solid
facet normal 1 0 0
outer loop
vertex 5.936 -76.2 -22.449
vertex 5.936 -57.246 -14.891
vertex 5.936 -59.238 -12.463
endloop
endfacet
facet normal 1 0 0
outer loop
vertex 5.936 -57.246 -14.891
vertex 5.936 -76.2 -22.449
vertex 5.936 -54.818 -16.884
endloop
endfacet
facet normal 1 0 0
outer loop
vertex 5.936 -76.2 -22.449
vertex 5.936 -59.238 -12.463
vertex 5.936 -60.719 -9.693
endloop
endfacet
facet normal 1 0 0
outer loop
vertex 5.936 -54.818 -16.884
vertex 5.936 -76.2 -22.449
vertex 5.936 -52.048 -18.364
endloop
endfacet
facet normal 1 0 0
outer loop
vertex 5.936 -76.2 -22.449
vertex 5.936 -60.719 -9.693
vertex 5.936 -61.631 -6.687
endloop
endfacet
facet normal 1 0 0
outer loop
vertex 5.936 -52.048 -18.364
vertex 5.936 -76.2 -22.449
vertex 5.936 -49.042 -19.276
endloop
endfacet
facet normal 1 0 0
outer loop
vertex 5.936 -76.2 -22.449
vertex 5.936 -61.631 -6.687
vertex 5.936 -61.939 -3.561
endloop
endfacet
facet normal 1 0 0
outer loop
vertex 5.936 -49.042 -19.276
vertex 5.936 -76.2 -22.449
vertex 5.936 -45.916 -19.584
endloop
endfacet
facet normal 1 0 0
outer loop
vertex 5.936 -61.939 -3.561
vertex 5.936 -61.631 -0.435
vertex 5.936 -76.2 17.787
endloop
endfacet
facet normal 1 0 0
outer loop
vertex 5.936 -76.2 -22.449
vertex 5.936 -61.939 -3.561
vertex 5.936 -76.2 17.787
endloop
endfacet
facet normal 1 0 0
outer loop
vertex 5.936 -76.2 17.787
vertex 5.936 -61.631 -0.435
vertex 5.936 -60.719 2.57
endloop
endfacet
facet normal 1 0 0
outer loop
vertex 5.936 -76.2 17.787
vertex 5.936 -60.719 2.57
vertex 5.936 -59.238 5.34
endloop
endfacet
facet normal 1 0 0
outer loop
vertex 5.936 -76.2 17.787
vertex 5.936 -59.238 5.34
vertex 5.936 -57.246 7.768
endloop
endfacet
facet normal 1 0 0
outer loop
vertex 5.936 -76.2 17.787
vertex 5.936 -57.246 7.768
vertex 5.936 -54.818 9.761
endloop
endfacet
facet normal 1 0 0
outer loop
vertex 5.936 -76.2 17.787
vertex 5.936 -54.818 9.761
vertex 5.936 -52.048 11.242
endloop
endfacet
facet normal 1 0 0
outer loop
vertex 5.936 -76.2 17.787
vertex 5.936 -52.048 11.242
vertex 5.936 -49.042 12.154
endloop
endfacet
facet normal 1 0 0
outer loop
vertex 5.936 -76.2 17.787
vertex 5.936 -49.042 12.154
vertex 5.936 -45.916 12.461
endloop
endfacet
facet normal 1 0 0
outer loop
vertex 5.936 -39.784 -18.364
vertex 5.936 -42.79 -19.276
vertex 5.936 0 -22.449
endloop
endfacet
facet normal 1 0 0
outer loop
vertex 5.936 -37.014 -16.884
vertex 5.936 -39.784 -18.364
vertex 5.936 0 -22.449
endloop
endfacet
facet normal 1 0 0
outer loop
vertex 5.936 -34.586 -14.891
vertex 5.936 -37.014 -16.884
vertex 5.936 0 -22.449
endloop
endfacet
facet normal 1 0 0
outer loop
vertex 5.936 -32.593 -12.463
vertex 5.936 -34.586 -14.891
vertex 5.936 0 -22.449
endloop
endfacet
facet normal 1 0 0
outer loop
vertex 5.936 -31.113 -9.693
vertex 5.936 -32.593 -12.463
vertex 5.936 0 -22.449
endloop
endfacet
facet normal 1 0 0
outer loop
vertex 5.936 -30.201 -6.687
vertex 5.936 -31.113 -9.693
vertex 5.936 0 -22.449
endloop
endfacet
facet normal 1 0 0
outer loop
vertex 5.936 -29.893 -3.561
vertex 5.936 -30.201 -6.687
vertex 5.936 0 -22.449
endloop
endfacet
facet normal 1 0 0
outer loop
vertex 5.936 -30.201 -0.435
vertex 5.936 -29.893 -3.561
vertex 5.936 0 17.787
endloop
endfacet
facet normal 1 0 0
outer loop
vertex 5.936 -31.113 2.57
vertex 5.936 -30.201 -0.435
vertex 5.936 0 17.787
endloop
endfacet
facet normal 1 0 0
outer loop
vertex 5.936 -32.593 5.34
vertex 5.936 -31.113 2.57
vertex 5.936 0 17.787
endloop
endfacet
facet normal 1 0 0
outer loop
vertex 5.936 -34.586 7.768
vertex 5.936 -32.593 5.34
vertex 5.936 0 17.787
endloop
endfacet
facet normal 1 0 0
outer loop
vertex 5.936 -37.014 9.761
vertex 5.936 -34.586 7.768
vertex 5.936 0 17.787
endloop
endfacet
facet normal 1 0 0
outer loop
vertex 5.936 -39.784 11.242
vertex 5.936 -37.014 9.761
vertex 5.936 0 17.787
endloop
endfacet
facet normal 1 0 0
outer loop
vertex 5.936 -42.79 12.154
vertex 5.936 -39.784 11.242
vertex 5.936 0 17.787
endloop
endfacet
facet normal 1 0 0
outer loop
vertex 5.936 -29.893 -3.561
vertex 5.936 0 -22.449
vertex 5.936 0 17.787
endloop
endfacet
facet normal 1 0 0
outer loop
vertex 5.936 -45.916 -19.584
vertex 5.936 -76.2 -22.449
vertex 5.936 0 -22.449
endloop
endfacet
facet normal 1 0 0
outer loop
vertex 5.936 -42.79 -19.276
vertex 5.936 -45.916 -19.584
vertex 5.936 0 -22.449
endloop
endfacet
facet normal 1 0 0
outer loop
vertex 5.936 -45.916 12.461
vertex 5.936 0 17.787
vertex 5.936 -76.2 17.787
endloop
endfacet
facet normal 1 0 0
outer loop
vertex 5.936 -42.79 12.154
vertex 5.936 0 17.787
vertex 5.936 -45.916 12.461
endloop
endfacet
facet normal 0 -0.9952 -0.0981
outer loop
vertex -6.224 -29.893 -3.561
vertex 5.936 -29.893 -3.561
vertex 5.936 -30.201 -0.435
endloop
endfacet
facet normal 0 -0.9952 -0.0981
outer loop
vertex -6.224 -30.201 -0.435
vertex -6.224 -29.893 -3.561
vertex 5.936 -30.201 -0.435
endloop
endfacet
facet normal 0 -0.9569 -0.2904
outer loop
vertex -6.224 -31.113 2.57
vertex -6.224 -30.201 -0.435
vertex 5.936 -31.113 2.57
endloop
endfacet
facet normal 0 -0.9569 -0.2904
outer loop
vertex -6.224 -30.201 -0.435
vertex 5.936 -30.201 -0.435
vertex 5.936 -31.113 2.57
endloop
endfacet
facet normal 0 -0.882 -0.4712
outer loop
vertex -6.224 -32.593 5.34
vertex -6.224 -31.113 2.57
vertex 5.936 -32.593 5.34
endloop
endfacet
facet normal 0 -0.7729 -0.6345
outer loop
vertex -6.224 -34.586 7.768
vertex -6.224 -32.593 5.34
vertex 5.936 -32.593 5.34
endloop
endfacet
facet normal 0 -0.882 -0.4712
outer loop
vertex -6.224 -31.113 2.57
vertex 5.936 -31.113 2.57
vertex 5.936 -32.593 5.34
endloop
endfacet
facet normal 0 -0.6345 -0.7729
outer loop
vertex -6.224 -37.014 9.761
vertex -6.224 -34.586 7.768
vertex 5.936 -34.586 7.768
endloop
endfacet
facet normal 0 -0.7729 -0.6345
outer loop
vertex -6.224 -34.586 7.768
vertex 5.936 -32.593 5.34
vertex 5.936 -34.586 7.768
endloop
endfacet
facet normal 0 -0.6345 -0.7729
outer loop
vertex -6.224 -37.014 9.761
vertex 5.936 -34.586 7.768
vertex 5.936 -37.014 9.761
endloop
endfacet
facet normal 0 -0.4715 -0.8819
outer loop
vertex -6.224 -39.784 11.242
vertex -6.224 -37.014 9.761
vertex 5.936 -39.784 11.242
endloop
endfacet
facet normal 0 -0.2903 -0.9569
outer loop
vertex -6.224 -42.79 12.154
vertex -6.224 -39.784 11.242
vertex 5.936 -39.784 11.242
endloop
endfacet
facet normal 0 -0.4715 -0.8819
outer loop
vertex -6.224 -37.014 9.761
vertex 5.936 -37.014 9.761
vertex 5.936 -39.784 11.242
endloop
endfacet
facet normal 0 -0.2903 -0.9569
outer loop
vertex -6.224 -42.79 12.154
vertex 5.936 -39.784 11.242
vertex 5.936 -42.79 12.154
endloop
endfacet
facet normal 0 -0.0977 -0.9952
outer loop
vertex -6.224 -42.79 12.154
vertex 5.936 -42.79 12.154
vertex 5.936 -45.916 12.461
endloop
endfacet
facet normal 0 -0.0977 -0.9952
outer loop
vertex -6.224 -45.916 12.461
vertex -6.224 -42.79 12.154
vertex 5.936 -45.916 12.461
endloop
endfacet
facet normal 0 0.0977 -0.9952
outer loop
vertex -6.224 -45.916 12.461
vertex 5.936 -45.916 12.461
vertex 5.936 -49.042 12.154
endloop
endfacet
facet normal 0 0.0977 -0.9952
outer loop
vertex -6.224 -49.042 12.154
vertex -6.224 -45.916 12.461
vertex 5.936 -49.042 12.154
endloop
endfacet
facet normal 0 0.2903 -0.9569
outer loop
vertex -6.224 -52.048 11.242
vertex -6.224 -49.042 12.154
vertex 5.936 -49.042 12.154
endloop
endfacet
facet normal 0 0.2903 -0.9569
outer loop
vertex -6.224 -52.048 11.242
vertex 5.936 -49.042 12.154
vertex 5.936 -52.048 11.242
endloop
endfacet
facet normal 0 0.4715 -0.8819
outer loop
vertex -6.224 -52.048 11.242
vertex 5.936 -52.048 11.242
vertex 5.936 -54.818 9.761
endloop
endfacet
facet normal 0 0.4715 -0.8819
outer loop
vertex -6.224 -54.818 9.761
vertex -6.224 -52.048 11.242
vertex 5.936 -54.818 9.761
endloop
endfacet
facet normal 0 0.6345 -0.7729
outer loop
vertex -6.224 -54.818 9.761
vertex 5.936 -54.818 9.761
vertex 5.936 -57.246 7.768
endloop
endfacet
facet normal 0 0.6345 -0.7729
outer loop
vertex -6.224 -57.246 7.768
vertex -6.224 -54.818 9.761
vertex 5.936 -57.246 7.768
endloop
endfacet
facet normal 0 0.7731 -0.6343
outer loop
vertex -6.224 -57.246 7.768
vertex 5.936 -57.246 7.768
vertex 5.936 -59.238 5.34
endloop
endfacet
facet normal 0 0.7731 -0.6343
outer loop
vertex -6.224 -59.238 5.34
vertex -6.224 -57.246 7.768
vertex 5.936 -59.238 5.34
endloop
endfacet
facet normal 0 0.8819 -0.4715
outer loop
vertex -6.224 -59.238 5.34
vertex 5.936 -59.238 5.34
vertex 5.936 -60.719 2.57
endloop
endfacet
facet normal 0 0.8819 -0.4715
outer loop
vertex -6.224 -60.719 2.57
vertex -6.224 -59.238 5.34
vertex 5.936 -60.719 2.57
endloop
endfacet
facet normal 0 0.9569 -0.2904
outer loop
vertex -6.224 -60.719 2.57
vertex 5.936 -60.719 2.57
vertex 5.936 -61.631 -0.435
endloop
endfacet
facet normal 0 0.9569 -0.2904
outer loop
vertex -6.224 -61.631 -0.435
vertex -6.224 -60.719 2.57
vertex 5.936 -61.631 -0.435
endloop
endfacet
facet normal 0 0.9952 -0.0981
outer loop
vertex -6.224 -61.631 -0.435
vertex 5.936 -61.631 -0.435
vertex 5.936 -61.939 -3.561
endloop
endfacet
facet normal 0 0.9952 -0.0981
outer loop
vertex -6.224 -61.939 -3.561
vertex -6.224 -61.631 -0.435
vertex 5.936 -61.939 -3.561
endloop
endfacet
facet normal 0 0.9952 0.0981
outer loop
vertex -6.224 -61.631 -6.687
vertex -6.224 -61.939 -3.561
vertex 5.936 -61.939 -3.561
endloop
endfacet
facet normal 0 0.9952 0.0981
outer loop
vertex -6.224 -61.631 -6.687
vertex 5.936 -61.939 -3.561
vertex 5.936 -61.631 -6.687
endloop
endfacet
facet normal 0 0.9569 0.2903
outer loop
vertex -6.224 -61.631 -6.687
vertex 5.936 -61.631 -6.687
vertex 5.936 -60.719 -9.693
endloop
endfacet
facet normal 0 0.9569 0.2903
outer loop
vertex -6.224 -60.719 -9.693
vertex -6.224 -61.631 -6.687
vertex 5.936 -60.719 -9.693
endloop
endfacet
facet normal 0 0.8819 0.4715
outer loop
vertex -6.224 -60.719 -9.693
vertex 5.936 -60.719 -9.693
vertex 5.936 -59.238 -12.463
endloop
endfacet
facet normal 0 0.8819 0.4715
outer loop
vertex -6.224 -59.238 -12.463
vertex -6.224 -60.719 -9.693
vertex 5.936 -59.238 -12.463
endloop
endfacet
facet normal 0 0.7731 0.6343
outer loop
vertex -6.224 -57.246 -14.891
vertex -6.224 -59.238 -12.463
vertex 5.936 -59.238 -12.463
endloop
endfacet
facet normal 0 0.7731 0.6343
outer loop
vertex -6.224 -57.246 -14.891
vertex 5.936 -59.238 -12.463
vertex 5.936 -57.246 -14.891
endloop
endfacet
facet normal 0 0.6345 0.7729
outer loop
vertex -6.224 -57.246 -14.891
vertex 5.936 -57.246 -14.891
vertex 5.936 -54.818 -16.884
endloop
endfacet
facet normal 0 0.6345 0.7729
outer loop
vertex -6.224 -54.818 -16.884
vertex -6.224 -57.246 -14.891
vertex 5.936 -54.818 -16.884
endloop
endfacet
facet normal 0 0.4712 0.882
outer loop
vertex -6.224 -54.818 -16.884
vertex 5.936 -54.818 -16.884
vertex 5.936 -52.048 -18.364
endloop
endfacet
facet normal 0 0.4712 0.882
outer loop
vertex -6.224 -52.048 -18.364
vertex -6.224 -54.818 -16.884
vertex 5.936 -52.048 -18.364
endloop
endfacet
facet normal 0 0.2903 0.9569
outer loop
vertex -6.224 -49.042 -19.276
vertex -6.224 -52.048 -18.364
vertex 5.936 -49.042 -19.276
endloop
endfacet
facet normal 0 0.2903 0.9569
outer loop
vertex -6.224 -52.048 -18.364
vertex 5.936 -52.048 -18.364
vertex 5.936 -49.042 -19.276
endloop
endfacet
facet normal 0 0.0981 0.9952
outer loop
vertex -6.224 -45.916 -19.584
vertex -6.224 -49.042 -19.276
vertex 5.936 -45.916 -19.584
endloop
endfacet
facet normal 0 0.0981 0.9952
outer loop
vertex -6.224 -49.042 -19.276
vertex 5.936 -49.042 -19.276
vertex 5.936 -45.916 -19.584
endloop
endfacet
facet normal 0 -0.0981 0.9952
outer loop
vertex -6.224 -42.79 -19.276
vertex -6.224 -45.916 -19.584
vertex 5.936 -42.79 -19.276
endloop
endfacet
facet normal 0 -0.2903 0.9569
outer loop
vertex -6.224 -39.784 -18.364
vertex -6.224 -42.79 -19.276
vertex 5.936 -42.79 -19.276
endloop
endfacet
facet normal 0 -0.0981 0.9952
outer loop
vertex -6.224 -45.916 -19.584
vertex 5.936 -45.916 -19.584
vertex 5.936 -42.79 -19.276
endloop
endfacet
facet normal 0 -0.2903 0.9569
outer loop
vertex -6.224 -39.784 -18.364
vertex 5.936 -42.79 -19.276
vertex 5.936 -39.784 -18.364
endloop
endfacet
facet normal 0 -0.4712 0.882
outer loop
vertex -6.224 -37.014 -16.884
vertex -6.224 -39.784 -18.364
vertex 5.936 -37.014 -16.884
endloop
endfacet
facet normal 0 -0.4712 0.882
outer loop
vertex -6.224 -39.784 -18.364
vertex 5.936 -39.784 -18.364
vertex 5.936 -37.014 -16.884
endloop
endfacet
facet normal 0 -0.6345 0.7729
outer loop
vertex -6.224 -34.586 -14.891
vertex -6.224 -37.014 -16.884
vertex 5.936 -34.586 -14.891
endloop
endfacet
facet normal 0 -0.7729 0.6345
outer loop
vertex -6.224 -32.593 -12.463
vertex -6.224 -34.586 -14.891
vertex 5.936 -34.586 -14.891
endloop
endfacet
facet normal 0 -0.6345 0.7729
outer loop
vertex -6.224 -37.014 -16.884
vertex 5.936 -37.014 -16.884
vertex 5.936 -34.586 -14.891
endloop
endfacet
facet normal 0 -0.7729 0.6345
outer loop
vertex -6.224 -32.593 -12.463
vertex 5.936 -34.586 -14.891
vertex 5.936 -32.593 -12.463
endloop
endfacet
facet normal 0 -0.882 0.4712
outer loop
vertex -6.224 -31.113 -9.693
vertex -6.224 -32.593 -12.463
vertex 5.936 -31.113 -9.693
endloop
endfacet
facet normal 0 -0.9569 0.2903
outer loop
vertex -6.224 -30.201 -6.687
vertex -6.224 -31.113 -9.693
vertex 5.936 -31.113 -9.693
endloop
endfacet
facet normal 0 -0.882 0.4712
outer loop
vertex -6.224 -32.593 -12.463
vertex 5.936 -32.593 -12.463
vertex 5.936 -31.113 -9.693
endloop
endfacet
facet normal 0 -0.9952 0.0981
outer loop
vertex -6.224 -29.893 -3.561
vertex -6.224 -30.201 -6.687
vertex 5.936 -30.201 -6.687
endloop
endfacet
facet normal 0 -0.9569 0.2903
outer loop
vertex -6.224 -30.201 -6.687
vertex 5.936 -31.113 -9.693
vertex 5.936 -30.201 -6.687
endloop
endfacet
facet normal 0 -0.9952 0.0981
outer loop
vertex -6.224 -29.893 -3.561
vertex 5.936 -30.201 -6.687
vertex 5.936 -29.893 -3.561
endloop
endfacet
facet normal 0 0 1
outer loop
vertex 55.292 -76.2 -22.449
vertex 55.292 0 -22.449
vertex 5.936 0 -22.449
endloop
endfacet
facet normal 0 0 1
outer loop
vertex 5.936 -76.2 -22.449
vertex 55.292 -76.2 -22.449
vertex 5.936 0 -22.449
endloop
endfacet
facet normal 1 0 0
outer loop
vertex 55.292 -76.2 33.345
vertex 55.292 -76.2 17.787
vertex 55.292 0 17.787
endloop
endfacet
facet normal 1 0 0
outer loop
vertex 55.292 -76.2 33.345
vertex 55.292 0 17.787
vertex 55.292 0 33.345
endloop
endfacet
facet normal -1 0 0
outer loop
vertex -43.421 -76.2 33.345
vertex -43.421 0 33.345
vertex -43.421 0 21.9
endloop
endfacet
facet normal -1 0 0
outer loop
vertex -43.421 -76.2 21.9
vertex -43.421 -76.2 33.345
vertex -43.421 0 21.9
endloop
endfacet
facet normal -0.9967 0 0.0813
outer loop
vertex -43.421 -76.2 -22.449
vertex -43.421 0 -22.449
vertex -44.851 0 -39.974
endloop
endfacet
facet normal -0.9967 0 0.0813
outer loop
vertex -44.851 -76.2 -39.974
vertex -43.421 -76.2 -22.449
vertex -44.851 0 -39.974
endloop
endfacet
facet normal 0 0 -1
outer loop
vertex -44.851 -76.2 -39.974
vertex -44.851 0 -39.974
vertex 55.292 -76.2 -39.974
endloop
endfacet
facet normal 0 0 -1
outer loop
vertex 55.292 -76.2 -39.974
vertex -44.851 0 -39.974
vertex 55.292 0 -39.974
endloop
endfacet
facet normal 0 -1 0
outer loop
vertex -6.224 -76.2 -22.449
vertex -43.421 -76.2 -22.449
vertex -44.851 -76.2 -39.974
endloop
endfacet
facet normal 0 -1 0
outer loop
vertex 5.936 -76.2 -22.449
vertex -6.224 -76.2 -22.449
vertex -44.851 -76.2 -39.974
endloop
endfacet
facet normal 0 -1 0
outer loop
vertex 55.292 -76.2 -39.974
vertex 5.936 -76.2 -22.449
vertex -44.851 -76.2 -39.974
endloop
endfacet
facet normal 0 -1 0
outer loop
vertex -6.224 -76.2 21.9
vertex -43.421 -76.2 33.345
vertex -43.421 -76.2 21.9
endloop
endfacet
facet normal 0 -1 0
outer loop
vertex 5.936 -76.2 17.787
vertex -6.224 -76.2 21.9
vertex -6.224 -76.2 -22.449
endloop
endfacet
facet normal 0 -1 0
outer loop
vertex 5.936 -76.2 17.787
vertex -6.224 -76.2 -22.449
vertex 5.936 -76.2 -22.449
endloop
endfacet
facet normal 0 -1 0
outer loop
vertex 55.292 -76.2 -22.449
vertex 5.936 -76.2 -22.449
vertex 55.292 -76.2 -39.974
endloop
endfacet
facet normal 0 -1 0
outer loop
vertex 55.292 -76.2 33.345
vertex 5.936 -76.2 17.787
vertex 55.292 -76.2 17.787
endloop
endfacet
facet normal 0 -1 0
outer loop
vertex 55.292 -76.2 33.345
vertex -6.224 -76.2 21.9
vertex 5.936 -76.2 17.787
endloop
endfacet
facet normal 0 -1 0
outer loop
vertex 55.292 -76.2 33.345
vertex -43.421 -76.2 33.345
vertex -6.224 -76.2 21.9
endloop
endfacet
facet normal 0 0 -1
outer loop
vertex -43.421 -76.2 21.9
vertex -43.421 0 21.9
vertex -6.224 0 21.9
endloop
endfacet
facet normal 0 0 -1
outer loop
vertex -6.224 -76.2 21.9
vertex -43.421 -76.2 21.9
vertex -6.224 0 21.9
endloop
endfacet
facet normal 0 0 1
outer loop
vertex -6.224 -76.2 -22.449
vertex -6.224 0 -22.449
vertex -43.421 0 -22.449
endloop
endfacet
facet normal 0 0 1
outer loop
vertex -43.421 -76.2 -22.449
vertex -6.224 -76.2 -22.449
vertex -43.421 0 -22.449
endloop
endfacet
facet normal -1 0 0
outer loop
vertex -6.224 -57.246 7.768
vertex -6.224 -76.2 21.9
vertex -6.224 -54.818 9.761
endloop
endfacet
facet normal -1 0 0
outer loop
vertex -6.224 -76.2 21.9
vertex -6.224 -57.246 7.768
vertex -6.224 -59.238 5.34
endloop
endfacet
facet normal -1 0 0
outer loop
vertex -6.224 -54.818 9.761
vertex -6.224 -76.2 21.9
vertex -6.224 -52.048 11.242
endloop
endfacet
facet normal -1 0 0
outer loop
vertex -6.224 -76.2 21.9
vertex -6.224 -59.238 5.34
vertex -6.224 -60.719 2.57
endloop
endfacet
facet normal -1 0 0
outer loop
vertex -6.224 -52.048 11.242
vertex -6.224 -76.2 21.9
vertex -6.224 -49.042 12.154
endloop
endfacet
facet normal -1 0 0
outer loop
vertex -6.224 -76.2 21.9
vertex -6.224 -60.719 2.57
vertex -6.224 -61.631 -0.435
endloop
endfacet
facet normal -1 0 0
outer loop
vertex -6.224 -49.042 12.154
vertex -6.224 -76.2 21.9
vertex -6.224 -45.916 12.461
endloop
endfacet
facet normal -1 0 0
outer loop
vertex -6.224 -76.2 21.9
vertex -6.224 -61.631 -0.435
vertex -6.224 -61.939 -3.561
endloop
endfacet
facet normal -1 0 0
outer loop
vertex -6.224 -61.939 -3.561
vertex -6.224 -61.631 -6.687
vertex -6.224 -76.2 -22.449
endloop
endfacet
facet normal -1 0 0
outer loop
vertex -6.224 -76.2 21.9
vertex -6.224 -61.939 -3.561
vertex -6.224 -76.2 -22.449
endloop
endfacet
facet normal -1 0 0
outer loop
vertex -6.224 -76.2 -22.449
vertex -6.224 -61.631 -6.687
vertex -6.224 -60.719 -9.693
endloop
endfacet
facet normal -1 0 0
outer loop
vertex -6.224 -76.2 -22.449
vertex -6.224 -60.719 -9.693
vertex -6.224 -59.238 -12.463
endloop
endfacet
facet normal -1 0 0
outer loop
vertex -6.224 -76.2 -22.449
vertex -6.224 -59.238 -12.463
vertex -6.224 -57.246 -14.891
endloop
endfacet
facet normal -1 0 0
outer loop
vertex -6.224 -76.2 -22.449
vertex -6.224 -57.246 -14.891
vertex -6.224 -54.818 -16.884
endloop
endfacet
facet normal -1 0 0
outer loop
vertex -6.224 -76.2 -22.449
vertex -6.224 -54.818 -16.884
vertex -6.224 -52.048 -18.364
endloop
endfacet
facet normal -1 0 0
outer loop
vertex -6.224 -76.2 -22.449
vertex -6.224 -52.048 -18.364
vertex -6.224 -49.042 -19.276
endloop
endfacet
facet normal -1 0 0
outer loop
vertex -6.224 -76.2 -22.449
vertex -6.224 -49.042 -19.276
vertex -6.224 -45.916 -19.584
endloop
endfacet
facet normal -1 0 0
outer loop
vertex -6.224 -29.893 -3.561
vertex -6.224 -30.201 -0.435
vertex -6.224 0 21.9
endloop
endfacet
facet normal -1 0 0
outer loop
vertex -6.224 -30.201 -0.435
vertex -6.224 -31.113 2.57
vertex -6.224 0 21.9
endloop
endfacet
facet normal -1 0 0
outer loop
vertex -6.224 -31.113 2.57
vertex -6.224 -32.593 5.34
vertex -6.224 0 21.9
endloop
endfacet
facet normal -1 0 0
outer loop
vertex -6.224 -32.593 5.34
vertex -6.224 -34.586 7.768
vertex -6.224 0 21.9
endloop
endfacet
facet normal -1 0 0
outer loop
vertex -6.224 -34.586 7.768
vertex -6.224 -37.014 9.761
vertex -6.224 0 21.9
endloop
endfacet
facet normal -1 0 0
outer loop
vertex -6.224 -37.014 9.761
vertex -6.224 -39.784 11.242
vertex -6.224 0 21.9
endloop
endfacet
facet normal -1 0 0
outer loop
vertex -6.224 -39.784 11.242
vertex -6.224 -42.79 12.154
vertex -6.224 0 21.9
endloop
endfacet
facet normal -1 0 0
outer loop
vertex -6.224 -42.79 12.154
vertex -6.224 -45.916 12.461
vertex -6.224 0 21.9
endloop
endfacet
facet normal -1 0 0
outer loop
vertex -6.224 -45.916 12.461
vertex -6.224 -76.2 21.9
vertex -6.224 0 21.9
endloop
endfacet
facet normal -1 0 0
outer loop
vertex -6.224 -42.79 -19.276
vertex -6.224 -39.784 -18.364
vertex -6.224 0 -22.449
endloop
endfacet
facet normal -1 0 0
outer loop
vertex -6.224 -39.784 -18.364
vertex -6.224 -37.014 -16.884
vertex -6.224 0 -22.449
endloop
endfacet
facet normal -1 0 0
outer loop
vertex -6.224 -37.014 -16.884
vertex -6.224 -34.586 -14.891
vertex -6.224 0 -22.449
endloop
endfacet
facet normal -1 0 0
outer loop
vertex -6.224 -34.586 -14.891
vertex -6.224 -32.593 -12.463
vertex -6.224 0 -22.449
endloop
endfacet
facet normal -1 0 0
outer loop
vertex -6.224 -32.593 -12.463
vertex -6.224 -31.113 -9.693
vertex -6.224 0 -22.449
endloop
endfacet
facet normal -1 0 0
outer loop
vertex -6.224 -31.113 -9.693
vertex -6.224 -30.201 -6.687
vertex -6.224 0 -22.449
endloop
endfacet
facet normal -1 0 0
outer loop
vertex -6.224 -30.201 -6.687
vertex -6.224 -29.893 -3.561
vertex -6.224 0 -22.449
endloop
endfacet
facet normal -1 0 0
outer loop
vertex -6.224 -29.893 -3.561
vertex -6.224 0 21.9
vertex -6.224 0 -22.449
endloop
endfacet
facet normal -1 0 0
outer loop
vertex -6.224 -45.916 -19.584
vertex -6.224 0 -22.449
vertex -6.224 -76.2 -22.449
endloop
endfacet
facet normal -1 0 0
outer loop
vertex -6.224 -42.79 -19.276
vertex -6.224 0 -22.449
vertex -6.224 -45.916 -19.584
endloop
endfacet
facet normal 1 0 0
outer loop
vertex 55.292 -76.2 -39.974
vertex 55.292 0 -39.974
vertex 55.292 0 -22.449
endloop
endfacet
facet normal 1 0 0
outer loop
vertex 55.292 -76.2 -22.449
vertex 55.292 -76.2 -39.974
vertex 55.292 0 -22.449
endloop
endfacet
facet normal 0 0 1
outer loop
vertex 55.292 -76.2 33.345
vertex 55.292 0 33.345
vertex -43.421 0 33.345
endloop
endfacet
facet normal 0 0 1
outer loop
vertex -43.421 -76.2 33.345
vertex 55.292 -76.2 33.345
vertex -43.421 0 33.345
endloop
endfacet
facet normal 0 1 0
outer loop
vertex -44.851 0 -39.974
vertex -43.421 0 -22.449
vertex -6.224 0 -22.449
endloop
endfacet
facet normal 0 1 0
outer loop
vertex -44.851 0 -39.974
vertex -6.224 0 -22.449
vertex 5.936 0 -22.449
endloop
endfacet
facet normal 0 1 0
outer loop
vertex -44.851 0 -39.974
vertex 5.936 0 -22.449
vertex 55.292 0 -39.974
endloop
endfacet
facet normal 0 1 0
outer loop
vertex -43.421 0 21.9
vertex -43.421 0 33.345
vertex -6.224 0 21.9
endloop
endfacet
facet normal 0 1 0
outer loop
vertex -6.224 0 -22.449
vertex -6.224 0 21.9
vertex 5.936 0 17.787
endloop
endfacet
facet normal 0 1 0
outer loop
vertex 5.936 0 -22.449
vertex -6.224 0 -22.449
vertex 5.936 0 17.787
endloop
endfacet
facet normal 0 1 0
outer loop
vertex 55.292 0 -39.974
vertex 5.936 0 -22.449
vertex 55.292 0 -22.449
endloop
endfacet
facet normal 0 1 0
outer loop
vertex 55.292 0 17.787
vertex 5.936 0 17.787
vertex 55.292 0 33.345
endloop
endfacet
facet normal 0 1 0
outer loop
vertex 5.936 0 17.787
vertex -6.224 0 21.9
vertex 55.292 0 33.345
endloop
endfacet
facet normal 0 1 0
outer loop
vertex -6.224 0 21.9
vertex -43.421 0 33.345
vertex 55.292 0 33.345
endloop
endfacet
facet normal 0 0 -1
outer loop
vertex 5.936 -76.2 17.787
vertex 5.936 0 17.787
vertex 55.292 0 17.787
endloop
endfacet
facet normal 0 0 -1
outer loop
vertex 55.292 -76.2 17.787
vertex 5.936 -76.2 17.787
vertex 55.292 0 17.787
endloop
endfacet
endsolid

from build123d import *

# Parameters (mm, degrees)
F1_DEPTH = 76.2
F2_R     = 16.022792
F3_DEPTH = 76.2


with BuildPart() as f1:
    # F0 (on Front) → F1 (new body)
    with BuildSketch(Plane.XZ):
        Polygon((-43.420587, -22.448728), (-44.851206, -39.973821), (55.292182, -39.973821), (55.292182, -22.448728), (5.935797, -22.448728), (5.935797, 17.787455), (55.292182, 17.787455), (55.292182, 33.34545), (-35.015699, 33.34545), (-43.420587, 33.34545), (-43.420587, 21.900488), (-6.224472, 21.900488), (-6.224472, -22.448728), align=None)
    extrude(amount=F1_DEPTH)

    # F2 (on face) → F3 (cut)
    with BuildSketch(Plane.YZ.offset(5.935797)):
        with Locations((-45.915954, -3.561358)):
            Circle(F2_R)
    extrude(amount=-F3_DEPTH, mode=Mode.SUBTRACT)


solid = f1.part
